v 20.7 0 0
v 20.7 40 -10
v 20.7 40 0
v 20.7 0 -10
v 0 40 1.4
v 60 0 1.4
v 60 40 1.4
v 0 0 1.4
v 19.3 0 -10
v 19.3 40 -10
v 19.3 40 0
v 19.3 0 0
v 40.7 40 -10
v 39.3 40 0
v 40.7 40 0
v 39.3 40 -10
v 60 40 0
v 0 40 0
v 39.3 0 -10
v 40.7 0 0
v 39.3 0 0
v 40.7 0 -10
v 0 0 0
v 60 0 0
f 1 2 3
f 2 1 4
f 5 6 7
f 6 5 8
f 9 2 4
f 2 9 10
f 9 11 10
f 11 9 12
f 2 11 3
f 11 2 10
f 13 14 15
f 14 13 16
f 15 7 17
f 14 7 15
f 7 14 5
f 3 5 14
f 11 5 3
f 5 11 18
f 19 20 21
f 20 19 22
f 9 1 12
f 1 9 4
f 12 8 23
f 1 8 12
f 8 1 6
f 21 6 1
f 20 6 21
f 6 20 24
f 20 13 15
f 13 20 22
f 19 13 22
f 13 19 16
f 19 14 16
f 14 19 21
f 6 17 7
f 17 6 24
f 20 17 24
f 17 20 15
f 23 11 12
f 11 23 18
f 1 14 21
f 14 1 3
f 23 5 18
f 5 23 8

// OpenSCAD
$fn = 32;

// ----------------------------------------------------------------------
// Ribbed panel: 1.4 mm panel
// ----------------------------------------------------------------------

// --- parameters (mm) ---
panel_l = 60;             // panel length, X
panel_w = 40;             // panel width, Y
panel_t = 1.4;            // panel thickness, Z
rib_t = 1.4;              // rib thickness
rib_h = 10;               // rib height below the panel
ribs = 2;                 // number of ribs

total_h = panel_t + rib_h;  // overall height

union() {
  cube([panel_l, panel_w, panel_t]);
  for (i = [1 : ribs])
    translate([i * panel_l / (ribs + 1) - rib_t / 2, 0, -rib_h])
      cube([rib_t, panel_w, rib_h + panel_t]);
}
